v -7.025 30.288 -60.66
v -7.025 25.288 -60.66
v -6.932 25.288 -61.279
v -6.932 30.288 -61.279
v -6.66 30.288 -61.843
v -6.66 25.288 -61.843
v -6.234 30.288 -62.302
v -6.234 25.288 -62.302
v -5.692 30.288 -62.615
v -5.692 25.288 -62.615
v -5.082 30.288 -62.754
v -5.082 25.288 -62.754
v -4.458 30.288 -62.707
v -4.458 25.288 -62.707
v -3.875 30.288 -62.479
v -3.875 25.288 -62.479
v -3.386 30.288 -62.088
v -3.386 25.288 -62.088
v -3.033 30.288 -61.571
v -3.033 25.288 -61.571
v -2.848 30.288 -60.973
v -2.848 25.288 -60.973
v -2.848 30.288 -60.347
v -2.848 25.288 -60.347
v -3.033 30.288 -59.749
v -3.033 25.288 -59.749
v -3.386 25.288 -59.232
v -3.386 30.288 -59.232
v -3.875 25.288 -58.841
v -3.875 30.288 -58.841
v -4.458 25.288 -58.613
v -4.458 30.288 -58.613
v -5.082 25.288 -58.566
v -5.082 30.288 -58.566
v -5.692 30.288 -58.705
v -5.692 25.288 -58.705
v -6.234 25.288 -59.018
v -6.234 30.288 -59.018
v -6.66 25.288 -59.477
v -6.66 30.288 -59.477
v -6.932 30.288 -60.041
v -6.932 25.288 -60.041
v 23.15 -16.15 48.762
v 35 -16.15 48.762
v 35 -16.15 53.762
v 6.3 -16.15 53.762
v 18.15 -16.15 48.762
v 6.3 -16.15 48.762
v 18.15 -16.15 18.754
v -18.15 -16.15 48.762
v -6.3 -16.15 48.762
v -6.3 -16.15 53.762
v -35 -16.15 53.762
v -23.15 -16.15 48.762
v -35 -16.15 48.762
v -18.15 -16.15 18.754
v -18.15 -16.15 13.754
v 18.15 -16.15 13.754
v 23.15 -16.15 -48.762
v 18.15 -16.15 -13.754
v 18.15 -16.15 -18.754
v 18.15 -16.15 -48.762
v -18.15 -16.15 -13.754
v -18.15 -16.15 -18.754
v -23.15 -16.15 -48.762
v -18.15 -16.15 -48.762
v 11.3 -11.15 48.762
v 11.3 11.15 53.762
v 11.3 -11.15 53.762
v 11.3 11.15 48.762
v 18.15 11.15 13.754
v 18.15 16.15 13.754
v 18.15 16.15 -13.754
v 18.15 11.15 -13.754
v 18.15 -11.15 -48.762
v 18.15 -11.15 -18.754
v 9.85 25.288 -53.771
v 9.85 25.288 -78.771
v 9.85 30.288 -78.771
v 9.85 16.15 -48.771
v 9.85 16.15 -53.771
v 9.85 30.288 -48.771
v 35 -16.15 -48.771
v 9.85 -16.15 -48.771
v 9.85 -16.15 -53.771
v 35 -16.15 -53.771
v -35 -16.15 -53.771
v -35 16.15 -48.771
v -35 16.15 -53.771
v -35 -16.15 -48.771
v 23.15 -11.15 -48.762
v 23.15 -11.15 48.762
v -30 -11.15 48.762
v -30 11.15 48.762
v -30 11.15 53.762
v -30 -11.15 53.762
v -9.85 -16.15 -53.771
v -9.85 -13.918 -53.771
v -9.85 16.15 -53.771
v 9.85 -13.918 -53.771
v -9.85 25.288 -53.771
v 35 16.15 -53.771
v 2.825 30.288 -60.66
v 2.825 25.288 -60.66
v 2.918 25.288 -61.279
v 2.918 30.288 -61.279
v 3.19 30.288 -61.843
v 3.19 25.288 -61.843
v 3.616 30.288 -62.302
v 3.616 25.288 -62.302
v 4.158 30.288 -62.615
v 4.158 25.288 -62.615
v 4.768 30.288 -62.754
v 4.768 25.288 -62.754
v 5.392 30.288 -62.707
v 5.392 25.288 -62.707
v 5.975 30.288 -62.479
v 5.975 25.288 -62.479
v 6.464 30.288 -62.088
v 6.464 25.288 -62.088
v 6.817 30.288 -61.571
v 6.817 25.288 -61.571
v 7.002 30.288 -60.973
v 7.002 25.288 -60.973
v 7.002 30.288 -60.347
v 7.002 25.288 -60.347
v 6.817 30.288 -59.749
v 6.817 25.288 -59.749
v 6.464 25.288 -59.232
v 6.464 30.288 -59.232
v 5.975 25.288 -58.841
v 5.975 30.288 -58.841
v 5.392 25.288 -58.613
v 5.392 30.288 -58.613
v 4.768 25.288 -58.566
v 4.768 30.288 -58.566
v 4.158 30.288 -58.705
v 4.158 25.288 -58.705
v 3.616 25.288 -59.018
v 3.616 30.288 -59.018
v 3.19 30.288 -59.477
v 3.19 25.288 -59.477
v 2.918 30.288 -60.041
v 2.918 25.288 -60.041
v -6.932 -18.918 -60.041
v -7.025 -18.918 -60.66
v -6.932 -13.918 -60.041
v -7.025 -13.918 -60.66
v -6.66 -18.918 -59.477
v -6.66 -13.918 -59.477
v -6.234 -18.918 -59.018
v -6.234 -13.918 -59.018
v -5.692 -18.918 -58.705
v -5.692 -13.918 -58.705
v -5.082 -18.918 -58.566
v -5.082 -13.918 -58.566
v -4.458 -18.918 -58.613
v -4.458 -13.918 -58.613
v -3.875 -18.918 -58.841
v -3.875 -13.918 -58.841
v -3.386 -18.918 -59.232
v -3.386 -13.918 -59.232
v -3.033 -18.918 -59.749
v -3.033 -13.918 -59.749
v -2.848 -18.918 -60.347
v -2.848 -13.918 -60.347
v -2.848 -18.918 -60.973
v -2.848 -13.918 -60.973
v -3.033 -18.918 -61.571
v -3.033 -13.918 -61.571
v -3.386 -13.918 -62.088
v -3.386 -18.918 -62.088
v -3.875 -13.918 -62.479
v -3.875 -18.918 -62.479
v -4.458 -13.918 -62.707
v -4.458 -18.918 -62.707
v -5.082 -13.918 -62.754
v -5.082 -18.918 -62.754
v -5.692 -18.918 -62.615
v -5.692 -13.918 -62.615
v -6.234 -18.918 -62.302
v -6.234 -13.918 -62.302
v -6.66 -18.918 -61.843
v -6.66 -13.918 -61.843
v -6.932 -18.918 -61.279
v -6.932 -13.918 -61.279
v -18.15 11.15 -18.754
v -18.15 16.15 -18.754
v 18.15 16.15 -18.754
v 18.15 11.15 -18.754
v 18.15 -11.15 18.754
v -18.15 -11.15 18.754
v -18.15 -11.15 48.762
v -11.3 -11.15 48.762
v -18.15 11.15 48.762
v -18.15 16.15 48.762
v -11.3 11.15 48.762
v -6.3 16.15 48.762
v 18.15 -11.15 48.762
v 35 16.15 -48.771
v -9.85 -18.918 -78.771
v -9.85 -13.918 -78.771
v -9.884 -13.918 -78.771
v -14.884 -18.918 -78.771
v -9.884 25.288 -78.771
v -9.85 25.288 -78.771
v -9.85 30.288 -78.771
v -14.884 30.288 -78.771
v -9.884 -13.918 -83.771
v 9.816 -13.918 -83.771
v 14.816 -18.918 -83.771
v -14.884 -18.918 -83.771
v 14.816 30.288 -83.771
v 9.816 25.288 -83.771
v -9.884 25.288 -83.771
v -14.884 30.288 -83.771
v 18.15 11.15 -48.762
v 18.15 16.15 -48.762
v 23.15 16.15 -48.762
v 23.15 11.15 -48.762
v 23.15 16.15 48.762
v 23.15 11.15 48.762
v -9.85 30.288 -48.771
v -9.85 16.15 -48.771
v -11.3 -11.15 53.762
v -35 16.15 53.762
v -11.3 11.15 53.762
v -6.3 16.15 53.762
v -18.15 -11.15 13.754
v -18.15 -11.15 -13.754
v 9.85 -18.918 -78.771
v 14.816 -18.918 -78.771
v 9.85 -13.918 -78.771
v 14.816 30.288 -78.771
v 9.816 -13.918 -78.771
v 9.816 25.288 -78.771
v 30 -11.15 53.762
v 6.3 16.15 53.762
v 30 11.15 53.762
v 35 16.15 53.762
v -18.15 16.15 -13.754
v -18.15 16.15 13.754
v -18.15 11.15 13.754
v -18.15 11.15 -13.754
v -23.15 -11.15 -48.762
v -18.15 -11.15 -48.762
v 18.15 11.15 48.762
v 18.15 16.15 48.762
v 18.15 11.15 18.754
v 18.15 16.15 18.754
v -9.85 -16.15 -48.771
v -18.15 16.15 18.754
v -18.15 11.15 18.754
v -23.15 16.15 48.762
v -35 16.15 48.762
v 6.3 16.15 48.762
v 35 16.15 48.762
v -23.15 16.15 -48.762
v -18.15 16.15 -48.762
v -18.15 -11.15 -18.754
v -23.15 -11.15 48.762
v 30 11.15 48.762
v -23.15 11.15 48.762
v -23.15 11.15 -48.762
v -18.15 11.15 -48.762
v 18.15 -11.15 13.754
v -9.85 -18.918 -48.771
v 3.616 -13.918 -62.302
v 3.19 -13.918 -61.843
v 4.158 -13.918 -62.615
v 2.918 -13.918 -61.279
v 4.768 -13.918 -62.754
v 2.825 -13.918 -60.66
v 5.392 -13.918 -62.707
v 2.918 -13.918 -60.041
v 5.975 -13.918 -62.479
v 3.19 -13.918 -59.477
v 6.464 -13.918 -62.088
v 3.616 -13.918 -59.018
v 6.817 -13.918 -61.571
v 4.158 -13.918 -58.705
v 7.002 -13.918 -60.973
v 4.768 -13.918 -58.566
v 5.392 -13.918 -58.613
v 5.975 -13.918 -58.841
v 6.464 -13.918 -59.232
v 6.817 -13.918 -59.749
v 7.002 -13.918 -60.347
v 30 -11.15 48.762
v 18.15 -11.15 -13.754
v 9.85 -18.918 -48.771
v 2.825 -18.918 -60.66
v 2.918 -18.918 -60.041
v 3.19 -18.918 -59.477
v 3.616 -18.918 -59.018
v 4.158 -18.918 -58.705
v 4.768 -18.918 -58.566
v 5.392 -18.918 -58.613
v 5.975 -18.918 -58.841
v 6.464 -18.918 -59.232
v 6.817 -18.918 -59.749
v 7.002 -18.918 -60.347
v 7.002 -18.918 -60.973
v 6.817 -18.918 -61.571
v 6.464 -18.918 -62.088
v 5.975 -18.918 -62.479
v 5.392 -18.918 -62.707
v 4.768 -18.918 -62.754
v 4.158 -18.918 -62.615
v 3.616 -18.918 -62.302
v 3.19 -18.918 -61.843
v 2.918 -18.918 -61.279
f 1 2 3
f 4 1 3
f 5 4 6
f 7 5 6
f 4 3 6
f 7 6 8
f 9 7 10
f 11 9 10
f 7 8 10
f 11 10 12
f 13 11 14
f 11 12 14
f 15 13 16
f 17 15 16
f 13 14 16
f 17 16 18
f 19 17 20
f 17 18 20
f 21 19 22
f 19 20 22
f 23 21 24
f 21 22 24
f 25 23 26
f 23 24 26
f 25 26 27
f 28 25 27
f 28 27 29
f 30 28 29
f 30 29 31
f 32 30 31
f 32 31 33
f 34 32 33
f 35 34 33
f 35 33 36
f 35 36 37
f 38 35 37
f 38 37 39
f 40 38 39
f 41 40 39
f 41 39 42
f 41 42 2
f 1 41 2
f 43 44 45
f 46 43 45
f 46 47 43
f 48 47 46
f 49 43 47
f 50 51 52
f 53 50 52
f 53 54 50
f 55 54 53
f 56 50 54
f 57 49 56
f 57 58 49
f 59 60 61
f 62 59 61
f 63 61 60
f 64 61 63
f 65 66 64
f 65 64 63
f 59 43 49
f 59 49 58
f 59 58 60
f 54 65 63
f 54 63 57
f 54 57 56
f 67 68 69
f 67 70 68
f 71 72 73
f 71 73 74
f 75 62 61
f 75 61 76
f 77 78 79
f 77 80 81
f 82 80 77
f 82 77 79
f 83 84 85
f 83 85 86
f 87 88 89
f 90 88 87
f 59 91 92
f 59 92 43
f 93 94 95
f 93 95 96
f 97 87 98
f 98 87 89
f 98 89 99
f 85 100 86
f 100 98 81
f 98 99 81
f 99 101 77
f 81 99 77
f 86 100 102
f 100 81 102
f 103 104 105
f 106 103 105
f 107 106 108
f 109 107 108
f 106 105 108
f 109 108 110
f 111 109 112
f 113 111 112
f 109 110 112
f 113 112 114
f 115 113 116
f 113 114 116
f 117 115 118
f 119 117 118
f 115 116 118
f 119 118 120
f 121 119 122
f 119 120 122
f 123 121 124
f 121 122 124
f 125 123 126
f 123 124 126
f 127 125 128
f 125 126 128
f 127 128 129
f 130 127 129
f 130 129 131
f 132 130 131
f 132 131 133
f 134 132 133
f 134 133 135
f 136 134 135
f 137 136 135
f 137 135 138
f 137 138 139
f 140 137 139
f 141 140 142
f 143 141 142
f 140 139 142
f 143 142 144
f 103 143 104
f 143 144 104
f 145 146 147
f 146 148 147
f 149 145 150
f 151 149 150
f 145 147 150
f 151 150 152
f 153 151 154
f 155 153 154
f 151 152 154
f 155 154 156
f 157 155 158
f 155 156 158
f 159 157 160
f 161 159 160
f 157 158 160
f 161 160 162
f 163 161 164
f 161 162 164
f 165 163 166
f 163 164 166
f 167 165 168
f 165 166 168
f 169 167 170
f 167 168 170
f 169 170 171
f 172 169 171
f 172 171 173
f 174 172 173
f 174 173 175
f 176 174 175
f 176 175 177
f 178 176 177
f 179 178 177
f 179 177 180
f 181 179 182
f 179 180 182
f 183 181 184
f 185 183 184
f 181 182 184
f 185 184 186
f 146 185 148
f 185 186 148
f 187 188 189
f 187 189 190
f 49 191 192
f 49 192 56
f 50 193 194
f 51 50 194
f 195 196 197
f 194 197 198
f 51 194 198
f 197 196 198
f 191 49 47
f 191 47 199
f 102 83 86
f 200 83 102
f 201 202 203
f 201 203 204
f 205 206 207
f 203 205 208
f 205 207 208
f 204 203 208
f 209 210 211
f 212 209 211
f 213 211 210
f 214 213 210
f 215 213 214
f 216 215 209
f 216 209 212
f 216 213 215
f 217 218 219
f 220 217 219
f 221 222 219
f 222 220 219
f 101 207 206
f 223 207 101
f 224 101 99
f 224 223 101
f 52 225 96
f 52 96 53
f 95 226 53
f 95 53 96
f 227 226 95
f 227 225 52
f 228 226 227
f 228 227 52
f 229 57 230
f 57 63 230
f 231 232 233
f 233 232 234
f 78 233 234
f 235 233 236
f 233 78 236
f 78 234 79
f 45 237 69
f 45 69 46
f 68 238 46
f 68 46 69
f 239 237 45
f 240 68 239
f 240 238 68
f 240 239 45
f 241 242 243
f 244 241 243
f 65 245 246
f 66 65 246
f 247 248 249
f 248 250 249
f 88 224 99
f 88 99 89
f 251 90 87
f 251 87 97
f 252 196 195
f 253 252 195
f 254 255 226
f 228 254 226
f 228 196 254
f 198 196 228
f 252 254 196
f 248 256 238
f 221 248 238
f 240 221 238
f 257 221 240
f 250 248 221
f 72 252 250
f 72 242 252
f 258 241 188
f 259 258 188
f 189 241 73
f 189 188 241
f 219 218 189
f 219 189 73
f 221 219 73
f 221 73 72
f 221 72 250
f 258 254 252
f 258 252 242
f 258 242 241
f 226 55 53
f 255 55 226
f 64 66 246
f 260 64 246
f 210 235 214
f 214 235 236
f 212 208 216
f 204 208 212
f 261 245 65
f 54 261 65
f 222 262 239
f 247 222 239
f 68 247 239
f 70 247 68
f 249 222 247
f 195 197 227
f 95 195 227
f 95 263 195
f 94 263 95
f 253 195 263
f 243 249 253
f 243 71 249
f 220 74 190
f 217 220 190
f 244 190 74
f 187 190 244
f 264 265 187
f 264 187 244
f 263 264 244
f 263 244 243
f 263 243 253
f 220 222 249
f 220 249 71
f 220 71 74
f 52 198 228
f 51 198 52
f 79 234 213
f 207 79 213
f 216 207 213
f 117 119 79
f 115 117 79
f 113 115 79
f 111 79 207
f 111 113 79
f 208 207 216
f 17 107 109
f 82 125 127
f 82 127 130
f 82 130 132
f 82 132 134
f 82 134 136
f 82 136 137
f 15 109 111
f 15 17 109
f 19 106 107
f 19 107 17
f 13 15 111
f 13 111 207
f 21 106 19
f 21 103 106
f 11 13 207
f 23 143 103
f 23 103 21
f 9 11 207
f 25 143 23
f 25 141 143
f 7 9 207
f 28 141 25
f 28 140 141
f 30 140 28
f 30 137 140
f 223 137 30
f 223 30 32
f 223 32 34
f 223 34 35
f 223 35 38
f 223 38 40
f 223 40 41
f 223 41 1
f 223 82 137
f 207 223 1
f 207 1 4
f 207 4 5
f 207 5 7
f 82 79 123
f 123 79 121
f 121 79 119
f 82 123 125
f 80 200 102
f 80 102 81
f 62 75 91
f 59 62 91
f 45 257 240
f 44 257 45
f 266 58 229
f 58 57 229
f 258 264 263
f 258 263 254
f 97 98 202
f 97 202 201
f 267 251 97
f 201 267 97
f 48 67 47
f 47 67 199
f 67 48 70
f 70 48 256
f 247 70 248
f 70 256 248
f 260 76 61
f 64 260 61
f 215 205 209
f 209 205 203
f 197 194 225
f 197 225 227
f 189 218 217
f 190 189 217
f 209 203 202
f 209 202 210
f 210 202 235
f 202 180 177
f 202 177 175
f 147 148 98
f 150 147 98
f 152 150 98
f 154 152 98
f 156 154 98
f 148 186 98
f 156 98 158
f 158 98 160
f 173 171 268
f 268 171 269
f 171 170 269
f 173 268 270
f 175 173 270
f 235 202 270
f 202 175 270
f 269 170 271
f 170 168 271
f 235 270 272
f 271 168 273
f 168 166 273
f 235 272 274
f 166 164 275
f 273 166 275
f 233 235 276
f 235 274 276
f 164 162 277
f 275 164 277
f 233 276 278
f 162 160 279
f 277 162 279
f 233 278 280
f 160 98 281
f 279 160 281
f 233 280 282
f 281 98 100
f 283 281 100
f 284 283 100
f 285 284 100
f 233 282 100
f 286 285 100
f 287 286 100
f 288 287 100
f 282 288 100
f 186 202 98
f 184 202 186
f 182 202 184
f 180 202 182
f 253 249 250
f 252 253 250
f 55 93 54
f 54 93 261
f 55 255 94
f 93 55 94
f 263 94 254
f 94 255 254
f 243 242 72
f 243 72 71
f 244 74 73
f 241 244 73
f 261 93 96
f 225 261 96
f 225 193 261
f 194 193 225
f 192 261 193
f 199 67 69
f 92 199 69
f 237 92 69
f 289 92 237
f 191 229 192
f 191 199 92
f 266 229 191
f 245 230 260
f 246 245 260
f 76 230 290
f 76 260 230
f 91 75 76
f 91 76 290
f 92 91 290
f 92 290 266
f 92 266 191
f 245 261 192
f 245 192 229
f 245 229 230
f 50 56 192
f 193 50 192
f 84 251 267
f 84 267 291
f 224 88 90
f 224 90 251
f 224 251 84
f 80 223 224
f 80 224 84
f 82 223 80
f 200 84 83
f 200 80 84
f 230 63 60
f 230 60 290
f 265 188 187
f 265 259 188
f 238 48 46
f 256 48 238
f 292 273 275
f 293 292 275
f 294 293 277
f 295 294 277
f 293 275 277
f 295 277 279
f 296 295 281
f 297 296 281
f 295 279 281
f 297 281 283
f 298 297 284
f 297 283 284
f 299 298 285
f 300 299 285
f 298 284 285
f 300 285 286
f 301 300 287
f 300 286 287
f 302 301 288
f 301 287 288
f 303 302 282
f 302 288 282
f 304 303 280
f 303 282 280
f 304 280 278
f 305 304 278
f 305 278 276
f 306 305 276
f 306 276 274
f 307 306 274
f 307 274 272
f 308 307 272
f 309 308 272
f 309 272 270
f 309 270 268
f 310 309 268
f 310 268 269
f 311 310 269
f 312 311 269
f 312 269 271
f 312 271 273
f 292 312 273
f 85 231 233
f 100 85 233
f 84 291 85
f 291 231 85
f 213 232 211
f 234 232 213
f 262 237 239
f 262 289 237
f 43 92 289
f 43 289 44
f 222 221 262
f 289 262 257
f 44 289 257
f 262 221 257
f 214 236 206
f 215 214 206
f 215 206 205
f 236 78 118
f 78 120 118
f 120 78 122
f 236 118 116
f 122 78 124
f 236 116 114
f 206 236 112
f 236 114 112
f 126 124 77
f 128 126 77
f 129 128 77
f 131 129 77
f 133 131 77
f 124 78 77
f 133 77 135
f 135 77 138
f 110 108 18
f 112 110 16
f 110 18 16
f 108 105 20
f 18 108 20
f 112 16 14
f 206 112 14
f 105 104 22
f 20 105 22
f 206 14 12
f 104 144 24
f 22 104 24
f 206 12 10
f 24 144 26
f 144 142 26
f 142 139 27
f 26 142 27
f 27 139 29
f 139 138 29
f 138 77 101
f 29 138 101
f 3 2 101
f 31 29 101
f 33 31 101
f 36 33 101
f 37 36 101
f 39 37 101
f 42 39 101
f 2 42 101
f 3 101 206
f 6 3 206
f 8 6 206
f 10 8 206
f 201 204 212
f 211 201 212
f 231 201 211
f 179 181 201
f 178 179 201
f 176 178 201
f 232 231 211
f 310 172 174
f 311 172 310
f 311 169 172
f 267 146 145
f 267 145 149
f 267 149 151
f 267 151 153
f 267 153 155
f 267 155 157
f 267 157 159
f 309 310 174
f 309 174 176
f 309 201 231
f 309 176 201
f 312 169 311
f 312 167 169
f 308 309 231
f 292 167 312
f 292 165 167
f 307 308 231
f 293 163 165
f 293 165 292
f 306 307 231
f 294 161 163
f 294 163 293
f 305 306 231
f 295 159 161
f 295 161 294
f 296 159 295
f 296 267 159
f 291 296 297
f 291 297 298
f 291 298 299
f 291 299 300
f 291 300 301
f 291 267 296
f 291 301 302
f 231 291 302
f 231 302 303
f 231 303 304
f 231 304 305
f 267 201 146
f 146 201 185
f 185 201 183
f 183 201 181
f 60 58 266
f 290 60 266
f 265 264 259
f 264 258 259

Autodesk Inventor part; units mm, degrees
sketch "Sketch1" plane through (0, 0, 0) normal (0, 0, 1) x (1, 0, 0)
  line L0 (-18.15, 11.15) -> (18.15, 11.15) construction
  line L1 (18.15, 11.15) -> (18.15, -11.15) construction
  line L2 (18.15, -11.15) -> (-18.15, -11.15) construction
  line L3 (-18.15, -11.15) -> (-18.15, 11.15) construction
  line L4 (-18.15, 11.15) -> (18.15, -11.15) construction
  line L5 (18.15, 11.15) -> (-18.15, -11.15) construction
  line L6 (-18.15, 11.15) -> (-23.15, 11.15)
  line L7 (-23.15, 11.15) -> (-23.15, 16.15)
  line L8 (-23.15, 16.15) -> (-18.15, 16.15)
  line L9 (-18.15, 16.15) -> (-18.15, 11.15)
  line L10 (18.15, 11.15) -> (23.15, 11.15)
  line L11 (23.15, 11.15) -> (23.15, 16.15)
  line L12 (23.15, 16.15) -> (18.15, 16.15)
  line L13 (18.15, 16.15) -> (18.15, 11.15)
  line L14 (18.15, -11.15) -> (23.15, -11.15)
  line L15 (23.15, -11.15) -> (23.15, -16.15)
  line L16 (23.15, -16.15) -> (18.15, -16.15)
  line L17 (18.15, -16.15) -> (18.15, -11.15)
  line L18 (-18.15, -11.15) -> (-23.15, -11.15)
  line L19 (-23.15, -11.15) -> (-23.15, -16.15)
  line L20 (-23.15, -16.15) -> (-18.15, -16.15)
  line L21 (-18.15, -16.15) -> (-18.15, -11.15)
  point P0 (0, 0)
  dimension "d0" = 36.3
  dimension "d1" = 22.3
  dimension "d2" = 5
  dimension "d3" = 5
  dimension "d4" = 5
  dimension "d5" = 5
  dimension "d6" = 5
  dimension "d7" = 5
  dimension "d8" = 5
  dimension "d9" = 5
extrude "Extrusion1" add sketch "Sketch1" along normal mid plane 97.524
ref_plane "Work Plane1" through (0, 0, 48.762) normal (0, 0, 1) x (1, 0, 0)
sketch "Sketch2" plane through (0, 0, 48.762) normal (0, 0, 1) x (1, 0, 0)
  line L0 (0, 0) -> (-20.65, 0) construction
  line L1 (0, 0) -> (20.65, 0) construction
  line L2 (-35, 16.15) -> (-6.3, 16.15)
  line L3 (-6.3, 16.15) -> (-6.3, -16.15)
  line L4 (-6.3, -16.15) -> (-35, -16.15)
  line L5 (-35, -16.15) -> (-35, 16.15)
  line L6 (-35, 16.15) -> (-6.3, -16.15) construction
  line L7 (-6.3, 16.15) -> (-35, -16.15) construction
  line L8 (6.3, 16.15) -> (35, 16.15)
  line L9 (35, 16.15) -> (35, -16.15)
  line L10 (35, -16.15) -> (6.3, -16.15)
  line L11 (6.3, -16.15) -> (6.3, 16.15)
  line L12 (6.3, 16.15) -> (35, -16.15) construction
  line L13 (35, 16.15) -> (6.3, -16.15) construction
  line L14 (-11.3, 11.15) -> (-30, 11.15)
  line L15 (-30, 11.15) -> (-30, -11.15)
  line L16 (-30, -11.15) -> (-11.3, -11.15)
  line L17 (-11.3, -11.15) -> (-11.3, 11.15)
  line L18 (30, 11.15) -> (11.3, 11.15)
  line L19 (11.3, 11.15) -> (11.3, -11.15)
  line L20 (11.3, -11.15) -> (30, -11.15)
  line L21 (30, -11.15) -> (30, 11.15)
  dimension "d13" = 20.65
  dimension "d14" = 20.65
  dimension "d15" = 28.7
  dimension "d16" = 32.3
  dimension "d17" = 28.7
  dimension "d18" = 32.3
  dimension "d19" = 5
  dimension "d20" = 5
extrude "Extrusion2" add sketch "Sketch2" along normal blind 5
ref_plane "Work Plane2" through (0, 0, -48.771) normal (0, 0, 1) x (1, 0, 0)
sketch "Sketch3" plane through (0, 0, -48.771) normal (0, 0, 1) x (1, 0, 0)
  line L0 (35, 16.15) -> (-35, 16.15)
  line L1 (-35, 16.15) -> (-35, -16.15)
  line L2 (-35, -16.15) -> (35, -16.15)
  line L3 (35, -16.15) -> (35, 16.15)
  line L4 (35, 16.15) -> (-35, -16.15) construction
  line L5 (-35, 16.15) -> (35, -16.15) construction
  line L6 (0, 0) -> (35, 0) construction
  line L7 (0, 0) -> (-35, 0) construction
  line L8 (-9.85, 16.15) -> (9.85, 16.15)
  line L9 (-9.85, -16.15) -> (9.85, -16.15)
  line L10 (9.85, 30.288) -> (-9.85, 30.288)
  line L11 (-9.85, 30.288) -> (-9.85, -18.918)
  line L12 (-9.85, -18.918) -> (9.85, -18.918)
  line L13 (9.85, -18.918) -> (9.85, 30.288)
  line L14 (9.85, 30.288) -> (-9.85, -18.918) construction
  line L15 (-9.85, 30.288) -> (9.85, -18.918) construction
  point P0 (11.3, -11.15)
  point P1 (-30, 11.15)
  point P2 (0, 5.685)
  dimension "d25" = 32.3
  dimension "d26" = 35
  dimension "d27" = 35
  dimension "d78" = 19.7
  dimension "d81" = 19.7
  dimension "d90" = 19.7
  dimension "d91" = 49.206
  dimension "d92" = 5.685
extrude "Extrusion3" add sketch "Sketch3" against normal blind 5
sketch "Sketch4" plane through (0, 0, 0) normal (1, 0, 0) x (0, 1, 0)
  line L0 (11.15, -48.762) -> (11.15, 48.762) projected
  line L1 (11.15, 18.754) -> (16.15, 18.754)
  line L2 (16.15, 18.754) -> (16.15, 13.754)
  line L3 (16.15, 13.754) -> (11.15, 13.754)
  line L4 (11.15, 13.754) -> (11.15, 18.754)
  line L5 (-11.15, 48.762) -> (11.15, 48.762) projected
  line L6 (11.15, -13.754) -> (16.15, -13.754)
  line L7 (16.15, -13.754) -> (16.15, -18.754)
  line L8 (16.15, -18.754) -> (11.15, -18.754)
  line L9 (11.15, -18.754) -> (11.15, -13.754)
  line L10 (16.15, -48.762) -> (11.15, -48.762) projected
  line L11 (-11.15, 48.762) -> (-11.15, -48.762) projected
  line L12 (-11.15, 18.754) -> (-16.15, 18.754)
  line L13 (-16.15, 18.754) -> (-16.15, 13.754)
  line L14 (-16.15, 13.754) -> (-11.15, 13.754)
  line L15 (-11.15, 13.754) -> (-11.15, 18.754)
  line L16 (-11.15, -18.754) -> (-16.15, -18.754)
  line L17 (-16.15, -18.754) -> (-16.15, -13.754)
  line L18 (-16.15, -13.754) -> (-11.15, -13.754)
  line L19 (-11.15, -13.754) -> (-11.15, -18.754)
  line L20 (-11.15, -48.762) -> (-16.15, -48.762) projected
  point P0 (0, 0)
  point P1 (-16.15, 48.762)
  point P2 (16.15, 48.762)
  dimension "d30" = 5
  dimension "d31" = 5
  dimension "d32" = 30.008
  dimension "d33" = 5
  dimension "d34" = 5
  dimension "d35" = 30.008
  dimension "d36" = 5
  dimension "d37" = 5
  dimension "d38" = 5
  dimension "d39" = 5
  dimension "d40" = 30.008
  dimension "d41" = 30.008
extrude "Extrusion4" add sketch "Sketch4" along normal mid plane 36.3
sketch "Sketch7" plane through (0, 0, -53.771) normal (0, 0, -1) x (-1, 0, 0)
  line L0 (9.85, 30.288) -> (-9.85, 30.288) projected
  line L1 (-9.85, 30.288) -> (9.85, 30.288)
  line L2 (9.85, 30.288) -> (9.85, 25.288)
  line L3 (9.85, 25.288) -> (-9.85, 25.288)
  line L4 (-9.85, 25.288) -> (-9.85, 30.288)
  line L5 (-9.85, -18.918) -> (9.85, -18.918) projected
  line L6 (9.85, -18.918) -> (-9.85, -18.918)
  line L7 (-9.85, -18.918) -> (-9.85, -13.918)
  line L8 (-9.85, -13.918) -> (9.85, -13.918)
  line L9 (9.85, -13.918) -> (9.85, -18.918)
  dimension "d93" = 5
  dimension "d94" = 5
extrude "Extrusion7" add sketch "Sketch7" along normal blind 25
ref_plane "Work Plane3" through (0, 0, -78.771) normal (0, 0, -1) x (-1, 0, 0)
sketch "Sketch8" plane through (0, 0, -78.771) normal (0, 0, -1) x (-1, 0, 0)
  line L0 (-9.85, 30.288) -> (9.85, 30.288) projected
  line L1 (9.85, -18.918) -> (-9.85, -18.918) projected
  line L2 (-6.7685, 30.288) -> (6.8371, 30.288)
  line L3 (6.8371, -18.918) -> (-6.7685, -18.918)
  line L4 (0.0343, 30.288) -> (0.0343, -18.918) construction
  line L5 (-14.8157, 30.288) -> (14.8843, 30.288)
  line L6 (14.8843, 30.288) -> (14.8843, -18.918)
  line L7 (14.8843, -18.918) -> (-14.8157, -18.918)
  line L8 (-14.8157, -18.918) -> (-14.8157, 30.288)
  line L9 (-14.8157, 30.288) -> (14.8843, -18.918) construction
  line L10 (14.8843, 30.288) -> (-14.8157, -18.918) construction
  line L11 (-9.8157, 25.288) -> (9.8843, 25.288)
  line L12 (9.8843, 25.288) -> (9.8843, -13.918)
  line L13 (9.8843, -13.918) -> (-9.8157, -13.918)
  line L14 (-9.8157, -13.918) -> (-9.8157, 25.288)
  point P0 (0.0343, 5.685)
  dimension "d95" = 29.7
  dimension "d96" = 5
extrude "Extrusion8" add sketch "Sketch8" along normal blind 5
sketch "Sketch10" plane through (0, 0, 0) normal (0, 1, 0) x (-1, 0, 0)
  circle A0 centre (-4.925, -60.66) radius 2.1
  line L0 (-9.85, -53.771) -> (9.85, -53.771) projected
  line L1 (-9.85, -53.771) -> (-9.85, -78.771) projected
  circle A1 centre (4.925, -60.66) radius 2.1
  line L2 (9.85, -53.771) -> (9.85, -78.771) projected
  point P0 (0, 0)
  dimension "d82" = 4.2
  dimension "d83" = 6.889
  dimension "d84" = 4.925
  dimension "d85" = 4.2
  dimension "d86" = 6.889
  dimension "d87" = 4.925
extrude "Extrusion10" cut sketch "Sketch10" along normal through all both and the other way through all
properties part number "MTail"
